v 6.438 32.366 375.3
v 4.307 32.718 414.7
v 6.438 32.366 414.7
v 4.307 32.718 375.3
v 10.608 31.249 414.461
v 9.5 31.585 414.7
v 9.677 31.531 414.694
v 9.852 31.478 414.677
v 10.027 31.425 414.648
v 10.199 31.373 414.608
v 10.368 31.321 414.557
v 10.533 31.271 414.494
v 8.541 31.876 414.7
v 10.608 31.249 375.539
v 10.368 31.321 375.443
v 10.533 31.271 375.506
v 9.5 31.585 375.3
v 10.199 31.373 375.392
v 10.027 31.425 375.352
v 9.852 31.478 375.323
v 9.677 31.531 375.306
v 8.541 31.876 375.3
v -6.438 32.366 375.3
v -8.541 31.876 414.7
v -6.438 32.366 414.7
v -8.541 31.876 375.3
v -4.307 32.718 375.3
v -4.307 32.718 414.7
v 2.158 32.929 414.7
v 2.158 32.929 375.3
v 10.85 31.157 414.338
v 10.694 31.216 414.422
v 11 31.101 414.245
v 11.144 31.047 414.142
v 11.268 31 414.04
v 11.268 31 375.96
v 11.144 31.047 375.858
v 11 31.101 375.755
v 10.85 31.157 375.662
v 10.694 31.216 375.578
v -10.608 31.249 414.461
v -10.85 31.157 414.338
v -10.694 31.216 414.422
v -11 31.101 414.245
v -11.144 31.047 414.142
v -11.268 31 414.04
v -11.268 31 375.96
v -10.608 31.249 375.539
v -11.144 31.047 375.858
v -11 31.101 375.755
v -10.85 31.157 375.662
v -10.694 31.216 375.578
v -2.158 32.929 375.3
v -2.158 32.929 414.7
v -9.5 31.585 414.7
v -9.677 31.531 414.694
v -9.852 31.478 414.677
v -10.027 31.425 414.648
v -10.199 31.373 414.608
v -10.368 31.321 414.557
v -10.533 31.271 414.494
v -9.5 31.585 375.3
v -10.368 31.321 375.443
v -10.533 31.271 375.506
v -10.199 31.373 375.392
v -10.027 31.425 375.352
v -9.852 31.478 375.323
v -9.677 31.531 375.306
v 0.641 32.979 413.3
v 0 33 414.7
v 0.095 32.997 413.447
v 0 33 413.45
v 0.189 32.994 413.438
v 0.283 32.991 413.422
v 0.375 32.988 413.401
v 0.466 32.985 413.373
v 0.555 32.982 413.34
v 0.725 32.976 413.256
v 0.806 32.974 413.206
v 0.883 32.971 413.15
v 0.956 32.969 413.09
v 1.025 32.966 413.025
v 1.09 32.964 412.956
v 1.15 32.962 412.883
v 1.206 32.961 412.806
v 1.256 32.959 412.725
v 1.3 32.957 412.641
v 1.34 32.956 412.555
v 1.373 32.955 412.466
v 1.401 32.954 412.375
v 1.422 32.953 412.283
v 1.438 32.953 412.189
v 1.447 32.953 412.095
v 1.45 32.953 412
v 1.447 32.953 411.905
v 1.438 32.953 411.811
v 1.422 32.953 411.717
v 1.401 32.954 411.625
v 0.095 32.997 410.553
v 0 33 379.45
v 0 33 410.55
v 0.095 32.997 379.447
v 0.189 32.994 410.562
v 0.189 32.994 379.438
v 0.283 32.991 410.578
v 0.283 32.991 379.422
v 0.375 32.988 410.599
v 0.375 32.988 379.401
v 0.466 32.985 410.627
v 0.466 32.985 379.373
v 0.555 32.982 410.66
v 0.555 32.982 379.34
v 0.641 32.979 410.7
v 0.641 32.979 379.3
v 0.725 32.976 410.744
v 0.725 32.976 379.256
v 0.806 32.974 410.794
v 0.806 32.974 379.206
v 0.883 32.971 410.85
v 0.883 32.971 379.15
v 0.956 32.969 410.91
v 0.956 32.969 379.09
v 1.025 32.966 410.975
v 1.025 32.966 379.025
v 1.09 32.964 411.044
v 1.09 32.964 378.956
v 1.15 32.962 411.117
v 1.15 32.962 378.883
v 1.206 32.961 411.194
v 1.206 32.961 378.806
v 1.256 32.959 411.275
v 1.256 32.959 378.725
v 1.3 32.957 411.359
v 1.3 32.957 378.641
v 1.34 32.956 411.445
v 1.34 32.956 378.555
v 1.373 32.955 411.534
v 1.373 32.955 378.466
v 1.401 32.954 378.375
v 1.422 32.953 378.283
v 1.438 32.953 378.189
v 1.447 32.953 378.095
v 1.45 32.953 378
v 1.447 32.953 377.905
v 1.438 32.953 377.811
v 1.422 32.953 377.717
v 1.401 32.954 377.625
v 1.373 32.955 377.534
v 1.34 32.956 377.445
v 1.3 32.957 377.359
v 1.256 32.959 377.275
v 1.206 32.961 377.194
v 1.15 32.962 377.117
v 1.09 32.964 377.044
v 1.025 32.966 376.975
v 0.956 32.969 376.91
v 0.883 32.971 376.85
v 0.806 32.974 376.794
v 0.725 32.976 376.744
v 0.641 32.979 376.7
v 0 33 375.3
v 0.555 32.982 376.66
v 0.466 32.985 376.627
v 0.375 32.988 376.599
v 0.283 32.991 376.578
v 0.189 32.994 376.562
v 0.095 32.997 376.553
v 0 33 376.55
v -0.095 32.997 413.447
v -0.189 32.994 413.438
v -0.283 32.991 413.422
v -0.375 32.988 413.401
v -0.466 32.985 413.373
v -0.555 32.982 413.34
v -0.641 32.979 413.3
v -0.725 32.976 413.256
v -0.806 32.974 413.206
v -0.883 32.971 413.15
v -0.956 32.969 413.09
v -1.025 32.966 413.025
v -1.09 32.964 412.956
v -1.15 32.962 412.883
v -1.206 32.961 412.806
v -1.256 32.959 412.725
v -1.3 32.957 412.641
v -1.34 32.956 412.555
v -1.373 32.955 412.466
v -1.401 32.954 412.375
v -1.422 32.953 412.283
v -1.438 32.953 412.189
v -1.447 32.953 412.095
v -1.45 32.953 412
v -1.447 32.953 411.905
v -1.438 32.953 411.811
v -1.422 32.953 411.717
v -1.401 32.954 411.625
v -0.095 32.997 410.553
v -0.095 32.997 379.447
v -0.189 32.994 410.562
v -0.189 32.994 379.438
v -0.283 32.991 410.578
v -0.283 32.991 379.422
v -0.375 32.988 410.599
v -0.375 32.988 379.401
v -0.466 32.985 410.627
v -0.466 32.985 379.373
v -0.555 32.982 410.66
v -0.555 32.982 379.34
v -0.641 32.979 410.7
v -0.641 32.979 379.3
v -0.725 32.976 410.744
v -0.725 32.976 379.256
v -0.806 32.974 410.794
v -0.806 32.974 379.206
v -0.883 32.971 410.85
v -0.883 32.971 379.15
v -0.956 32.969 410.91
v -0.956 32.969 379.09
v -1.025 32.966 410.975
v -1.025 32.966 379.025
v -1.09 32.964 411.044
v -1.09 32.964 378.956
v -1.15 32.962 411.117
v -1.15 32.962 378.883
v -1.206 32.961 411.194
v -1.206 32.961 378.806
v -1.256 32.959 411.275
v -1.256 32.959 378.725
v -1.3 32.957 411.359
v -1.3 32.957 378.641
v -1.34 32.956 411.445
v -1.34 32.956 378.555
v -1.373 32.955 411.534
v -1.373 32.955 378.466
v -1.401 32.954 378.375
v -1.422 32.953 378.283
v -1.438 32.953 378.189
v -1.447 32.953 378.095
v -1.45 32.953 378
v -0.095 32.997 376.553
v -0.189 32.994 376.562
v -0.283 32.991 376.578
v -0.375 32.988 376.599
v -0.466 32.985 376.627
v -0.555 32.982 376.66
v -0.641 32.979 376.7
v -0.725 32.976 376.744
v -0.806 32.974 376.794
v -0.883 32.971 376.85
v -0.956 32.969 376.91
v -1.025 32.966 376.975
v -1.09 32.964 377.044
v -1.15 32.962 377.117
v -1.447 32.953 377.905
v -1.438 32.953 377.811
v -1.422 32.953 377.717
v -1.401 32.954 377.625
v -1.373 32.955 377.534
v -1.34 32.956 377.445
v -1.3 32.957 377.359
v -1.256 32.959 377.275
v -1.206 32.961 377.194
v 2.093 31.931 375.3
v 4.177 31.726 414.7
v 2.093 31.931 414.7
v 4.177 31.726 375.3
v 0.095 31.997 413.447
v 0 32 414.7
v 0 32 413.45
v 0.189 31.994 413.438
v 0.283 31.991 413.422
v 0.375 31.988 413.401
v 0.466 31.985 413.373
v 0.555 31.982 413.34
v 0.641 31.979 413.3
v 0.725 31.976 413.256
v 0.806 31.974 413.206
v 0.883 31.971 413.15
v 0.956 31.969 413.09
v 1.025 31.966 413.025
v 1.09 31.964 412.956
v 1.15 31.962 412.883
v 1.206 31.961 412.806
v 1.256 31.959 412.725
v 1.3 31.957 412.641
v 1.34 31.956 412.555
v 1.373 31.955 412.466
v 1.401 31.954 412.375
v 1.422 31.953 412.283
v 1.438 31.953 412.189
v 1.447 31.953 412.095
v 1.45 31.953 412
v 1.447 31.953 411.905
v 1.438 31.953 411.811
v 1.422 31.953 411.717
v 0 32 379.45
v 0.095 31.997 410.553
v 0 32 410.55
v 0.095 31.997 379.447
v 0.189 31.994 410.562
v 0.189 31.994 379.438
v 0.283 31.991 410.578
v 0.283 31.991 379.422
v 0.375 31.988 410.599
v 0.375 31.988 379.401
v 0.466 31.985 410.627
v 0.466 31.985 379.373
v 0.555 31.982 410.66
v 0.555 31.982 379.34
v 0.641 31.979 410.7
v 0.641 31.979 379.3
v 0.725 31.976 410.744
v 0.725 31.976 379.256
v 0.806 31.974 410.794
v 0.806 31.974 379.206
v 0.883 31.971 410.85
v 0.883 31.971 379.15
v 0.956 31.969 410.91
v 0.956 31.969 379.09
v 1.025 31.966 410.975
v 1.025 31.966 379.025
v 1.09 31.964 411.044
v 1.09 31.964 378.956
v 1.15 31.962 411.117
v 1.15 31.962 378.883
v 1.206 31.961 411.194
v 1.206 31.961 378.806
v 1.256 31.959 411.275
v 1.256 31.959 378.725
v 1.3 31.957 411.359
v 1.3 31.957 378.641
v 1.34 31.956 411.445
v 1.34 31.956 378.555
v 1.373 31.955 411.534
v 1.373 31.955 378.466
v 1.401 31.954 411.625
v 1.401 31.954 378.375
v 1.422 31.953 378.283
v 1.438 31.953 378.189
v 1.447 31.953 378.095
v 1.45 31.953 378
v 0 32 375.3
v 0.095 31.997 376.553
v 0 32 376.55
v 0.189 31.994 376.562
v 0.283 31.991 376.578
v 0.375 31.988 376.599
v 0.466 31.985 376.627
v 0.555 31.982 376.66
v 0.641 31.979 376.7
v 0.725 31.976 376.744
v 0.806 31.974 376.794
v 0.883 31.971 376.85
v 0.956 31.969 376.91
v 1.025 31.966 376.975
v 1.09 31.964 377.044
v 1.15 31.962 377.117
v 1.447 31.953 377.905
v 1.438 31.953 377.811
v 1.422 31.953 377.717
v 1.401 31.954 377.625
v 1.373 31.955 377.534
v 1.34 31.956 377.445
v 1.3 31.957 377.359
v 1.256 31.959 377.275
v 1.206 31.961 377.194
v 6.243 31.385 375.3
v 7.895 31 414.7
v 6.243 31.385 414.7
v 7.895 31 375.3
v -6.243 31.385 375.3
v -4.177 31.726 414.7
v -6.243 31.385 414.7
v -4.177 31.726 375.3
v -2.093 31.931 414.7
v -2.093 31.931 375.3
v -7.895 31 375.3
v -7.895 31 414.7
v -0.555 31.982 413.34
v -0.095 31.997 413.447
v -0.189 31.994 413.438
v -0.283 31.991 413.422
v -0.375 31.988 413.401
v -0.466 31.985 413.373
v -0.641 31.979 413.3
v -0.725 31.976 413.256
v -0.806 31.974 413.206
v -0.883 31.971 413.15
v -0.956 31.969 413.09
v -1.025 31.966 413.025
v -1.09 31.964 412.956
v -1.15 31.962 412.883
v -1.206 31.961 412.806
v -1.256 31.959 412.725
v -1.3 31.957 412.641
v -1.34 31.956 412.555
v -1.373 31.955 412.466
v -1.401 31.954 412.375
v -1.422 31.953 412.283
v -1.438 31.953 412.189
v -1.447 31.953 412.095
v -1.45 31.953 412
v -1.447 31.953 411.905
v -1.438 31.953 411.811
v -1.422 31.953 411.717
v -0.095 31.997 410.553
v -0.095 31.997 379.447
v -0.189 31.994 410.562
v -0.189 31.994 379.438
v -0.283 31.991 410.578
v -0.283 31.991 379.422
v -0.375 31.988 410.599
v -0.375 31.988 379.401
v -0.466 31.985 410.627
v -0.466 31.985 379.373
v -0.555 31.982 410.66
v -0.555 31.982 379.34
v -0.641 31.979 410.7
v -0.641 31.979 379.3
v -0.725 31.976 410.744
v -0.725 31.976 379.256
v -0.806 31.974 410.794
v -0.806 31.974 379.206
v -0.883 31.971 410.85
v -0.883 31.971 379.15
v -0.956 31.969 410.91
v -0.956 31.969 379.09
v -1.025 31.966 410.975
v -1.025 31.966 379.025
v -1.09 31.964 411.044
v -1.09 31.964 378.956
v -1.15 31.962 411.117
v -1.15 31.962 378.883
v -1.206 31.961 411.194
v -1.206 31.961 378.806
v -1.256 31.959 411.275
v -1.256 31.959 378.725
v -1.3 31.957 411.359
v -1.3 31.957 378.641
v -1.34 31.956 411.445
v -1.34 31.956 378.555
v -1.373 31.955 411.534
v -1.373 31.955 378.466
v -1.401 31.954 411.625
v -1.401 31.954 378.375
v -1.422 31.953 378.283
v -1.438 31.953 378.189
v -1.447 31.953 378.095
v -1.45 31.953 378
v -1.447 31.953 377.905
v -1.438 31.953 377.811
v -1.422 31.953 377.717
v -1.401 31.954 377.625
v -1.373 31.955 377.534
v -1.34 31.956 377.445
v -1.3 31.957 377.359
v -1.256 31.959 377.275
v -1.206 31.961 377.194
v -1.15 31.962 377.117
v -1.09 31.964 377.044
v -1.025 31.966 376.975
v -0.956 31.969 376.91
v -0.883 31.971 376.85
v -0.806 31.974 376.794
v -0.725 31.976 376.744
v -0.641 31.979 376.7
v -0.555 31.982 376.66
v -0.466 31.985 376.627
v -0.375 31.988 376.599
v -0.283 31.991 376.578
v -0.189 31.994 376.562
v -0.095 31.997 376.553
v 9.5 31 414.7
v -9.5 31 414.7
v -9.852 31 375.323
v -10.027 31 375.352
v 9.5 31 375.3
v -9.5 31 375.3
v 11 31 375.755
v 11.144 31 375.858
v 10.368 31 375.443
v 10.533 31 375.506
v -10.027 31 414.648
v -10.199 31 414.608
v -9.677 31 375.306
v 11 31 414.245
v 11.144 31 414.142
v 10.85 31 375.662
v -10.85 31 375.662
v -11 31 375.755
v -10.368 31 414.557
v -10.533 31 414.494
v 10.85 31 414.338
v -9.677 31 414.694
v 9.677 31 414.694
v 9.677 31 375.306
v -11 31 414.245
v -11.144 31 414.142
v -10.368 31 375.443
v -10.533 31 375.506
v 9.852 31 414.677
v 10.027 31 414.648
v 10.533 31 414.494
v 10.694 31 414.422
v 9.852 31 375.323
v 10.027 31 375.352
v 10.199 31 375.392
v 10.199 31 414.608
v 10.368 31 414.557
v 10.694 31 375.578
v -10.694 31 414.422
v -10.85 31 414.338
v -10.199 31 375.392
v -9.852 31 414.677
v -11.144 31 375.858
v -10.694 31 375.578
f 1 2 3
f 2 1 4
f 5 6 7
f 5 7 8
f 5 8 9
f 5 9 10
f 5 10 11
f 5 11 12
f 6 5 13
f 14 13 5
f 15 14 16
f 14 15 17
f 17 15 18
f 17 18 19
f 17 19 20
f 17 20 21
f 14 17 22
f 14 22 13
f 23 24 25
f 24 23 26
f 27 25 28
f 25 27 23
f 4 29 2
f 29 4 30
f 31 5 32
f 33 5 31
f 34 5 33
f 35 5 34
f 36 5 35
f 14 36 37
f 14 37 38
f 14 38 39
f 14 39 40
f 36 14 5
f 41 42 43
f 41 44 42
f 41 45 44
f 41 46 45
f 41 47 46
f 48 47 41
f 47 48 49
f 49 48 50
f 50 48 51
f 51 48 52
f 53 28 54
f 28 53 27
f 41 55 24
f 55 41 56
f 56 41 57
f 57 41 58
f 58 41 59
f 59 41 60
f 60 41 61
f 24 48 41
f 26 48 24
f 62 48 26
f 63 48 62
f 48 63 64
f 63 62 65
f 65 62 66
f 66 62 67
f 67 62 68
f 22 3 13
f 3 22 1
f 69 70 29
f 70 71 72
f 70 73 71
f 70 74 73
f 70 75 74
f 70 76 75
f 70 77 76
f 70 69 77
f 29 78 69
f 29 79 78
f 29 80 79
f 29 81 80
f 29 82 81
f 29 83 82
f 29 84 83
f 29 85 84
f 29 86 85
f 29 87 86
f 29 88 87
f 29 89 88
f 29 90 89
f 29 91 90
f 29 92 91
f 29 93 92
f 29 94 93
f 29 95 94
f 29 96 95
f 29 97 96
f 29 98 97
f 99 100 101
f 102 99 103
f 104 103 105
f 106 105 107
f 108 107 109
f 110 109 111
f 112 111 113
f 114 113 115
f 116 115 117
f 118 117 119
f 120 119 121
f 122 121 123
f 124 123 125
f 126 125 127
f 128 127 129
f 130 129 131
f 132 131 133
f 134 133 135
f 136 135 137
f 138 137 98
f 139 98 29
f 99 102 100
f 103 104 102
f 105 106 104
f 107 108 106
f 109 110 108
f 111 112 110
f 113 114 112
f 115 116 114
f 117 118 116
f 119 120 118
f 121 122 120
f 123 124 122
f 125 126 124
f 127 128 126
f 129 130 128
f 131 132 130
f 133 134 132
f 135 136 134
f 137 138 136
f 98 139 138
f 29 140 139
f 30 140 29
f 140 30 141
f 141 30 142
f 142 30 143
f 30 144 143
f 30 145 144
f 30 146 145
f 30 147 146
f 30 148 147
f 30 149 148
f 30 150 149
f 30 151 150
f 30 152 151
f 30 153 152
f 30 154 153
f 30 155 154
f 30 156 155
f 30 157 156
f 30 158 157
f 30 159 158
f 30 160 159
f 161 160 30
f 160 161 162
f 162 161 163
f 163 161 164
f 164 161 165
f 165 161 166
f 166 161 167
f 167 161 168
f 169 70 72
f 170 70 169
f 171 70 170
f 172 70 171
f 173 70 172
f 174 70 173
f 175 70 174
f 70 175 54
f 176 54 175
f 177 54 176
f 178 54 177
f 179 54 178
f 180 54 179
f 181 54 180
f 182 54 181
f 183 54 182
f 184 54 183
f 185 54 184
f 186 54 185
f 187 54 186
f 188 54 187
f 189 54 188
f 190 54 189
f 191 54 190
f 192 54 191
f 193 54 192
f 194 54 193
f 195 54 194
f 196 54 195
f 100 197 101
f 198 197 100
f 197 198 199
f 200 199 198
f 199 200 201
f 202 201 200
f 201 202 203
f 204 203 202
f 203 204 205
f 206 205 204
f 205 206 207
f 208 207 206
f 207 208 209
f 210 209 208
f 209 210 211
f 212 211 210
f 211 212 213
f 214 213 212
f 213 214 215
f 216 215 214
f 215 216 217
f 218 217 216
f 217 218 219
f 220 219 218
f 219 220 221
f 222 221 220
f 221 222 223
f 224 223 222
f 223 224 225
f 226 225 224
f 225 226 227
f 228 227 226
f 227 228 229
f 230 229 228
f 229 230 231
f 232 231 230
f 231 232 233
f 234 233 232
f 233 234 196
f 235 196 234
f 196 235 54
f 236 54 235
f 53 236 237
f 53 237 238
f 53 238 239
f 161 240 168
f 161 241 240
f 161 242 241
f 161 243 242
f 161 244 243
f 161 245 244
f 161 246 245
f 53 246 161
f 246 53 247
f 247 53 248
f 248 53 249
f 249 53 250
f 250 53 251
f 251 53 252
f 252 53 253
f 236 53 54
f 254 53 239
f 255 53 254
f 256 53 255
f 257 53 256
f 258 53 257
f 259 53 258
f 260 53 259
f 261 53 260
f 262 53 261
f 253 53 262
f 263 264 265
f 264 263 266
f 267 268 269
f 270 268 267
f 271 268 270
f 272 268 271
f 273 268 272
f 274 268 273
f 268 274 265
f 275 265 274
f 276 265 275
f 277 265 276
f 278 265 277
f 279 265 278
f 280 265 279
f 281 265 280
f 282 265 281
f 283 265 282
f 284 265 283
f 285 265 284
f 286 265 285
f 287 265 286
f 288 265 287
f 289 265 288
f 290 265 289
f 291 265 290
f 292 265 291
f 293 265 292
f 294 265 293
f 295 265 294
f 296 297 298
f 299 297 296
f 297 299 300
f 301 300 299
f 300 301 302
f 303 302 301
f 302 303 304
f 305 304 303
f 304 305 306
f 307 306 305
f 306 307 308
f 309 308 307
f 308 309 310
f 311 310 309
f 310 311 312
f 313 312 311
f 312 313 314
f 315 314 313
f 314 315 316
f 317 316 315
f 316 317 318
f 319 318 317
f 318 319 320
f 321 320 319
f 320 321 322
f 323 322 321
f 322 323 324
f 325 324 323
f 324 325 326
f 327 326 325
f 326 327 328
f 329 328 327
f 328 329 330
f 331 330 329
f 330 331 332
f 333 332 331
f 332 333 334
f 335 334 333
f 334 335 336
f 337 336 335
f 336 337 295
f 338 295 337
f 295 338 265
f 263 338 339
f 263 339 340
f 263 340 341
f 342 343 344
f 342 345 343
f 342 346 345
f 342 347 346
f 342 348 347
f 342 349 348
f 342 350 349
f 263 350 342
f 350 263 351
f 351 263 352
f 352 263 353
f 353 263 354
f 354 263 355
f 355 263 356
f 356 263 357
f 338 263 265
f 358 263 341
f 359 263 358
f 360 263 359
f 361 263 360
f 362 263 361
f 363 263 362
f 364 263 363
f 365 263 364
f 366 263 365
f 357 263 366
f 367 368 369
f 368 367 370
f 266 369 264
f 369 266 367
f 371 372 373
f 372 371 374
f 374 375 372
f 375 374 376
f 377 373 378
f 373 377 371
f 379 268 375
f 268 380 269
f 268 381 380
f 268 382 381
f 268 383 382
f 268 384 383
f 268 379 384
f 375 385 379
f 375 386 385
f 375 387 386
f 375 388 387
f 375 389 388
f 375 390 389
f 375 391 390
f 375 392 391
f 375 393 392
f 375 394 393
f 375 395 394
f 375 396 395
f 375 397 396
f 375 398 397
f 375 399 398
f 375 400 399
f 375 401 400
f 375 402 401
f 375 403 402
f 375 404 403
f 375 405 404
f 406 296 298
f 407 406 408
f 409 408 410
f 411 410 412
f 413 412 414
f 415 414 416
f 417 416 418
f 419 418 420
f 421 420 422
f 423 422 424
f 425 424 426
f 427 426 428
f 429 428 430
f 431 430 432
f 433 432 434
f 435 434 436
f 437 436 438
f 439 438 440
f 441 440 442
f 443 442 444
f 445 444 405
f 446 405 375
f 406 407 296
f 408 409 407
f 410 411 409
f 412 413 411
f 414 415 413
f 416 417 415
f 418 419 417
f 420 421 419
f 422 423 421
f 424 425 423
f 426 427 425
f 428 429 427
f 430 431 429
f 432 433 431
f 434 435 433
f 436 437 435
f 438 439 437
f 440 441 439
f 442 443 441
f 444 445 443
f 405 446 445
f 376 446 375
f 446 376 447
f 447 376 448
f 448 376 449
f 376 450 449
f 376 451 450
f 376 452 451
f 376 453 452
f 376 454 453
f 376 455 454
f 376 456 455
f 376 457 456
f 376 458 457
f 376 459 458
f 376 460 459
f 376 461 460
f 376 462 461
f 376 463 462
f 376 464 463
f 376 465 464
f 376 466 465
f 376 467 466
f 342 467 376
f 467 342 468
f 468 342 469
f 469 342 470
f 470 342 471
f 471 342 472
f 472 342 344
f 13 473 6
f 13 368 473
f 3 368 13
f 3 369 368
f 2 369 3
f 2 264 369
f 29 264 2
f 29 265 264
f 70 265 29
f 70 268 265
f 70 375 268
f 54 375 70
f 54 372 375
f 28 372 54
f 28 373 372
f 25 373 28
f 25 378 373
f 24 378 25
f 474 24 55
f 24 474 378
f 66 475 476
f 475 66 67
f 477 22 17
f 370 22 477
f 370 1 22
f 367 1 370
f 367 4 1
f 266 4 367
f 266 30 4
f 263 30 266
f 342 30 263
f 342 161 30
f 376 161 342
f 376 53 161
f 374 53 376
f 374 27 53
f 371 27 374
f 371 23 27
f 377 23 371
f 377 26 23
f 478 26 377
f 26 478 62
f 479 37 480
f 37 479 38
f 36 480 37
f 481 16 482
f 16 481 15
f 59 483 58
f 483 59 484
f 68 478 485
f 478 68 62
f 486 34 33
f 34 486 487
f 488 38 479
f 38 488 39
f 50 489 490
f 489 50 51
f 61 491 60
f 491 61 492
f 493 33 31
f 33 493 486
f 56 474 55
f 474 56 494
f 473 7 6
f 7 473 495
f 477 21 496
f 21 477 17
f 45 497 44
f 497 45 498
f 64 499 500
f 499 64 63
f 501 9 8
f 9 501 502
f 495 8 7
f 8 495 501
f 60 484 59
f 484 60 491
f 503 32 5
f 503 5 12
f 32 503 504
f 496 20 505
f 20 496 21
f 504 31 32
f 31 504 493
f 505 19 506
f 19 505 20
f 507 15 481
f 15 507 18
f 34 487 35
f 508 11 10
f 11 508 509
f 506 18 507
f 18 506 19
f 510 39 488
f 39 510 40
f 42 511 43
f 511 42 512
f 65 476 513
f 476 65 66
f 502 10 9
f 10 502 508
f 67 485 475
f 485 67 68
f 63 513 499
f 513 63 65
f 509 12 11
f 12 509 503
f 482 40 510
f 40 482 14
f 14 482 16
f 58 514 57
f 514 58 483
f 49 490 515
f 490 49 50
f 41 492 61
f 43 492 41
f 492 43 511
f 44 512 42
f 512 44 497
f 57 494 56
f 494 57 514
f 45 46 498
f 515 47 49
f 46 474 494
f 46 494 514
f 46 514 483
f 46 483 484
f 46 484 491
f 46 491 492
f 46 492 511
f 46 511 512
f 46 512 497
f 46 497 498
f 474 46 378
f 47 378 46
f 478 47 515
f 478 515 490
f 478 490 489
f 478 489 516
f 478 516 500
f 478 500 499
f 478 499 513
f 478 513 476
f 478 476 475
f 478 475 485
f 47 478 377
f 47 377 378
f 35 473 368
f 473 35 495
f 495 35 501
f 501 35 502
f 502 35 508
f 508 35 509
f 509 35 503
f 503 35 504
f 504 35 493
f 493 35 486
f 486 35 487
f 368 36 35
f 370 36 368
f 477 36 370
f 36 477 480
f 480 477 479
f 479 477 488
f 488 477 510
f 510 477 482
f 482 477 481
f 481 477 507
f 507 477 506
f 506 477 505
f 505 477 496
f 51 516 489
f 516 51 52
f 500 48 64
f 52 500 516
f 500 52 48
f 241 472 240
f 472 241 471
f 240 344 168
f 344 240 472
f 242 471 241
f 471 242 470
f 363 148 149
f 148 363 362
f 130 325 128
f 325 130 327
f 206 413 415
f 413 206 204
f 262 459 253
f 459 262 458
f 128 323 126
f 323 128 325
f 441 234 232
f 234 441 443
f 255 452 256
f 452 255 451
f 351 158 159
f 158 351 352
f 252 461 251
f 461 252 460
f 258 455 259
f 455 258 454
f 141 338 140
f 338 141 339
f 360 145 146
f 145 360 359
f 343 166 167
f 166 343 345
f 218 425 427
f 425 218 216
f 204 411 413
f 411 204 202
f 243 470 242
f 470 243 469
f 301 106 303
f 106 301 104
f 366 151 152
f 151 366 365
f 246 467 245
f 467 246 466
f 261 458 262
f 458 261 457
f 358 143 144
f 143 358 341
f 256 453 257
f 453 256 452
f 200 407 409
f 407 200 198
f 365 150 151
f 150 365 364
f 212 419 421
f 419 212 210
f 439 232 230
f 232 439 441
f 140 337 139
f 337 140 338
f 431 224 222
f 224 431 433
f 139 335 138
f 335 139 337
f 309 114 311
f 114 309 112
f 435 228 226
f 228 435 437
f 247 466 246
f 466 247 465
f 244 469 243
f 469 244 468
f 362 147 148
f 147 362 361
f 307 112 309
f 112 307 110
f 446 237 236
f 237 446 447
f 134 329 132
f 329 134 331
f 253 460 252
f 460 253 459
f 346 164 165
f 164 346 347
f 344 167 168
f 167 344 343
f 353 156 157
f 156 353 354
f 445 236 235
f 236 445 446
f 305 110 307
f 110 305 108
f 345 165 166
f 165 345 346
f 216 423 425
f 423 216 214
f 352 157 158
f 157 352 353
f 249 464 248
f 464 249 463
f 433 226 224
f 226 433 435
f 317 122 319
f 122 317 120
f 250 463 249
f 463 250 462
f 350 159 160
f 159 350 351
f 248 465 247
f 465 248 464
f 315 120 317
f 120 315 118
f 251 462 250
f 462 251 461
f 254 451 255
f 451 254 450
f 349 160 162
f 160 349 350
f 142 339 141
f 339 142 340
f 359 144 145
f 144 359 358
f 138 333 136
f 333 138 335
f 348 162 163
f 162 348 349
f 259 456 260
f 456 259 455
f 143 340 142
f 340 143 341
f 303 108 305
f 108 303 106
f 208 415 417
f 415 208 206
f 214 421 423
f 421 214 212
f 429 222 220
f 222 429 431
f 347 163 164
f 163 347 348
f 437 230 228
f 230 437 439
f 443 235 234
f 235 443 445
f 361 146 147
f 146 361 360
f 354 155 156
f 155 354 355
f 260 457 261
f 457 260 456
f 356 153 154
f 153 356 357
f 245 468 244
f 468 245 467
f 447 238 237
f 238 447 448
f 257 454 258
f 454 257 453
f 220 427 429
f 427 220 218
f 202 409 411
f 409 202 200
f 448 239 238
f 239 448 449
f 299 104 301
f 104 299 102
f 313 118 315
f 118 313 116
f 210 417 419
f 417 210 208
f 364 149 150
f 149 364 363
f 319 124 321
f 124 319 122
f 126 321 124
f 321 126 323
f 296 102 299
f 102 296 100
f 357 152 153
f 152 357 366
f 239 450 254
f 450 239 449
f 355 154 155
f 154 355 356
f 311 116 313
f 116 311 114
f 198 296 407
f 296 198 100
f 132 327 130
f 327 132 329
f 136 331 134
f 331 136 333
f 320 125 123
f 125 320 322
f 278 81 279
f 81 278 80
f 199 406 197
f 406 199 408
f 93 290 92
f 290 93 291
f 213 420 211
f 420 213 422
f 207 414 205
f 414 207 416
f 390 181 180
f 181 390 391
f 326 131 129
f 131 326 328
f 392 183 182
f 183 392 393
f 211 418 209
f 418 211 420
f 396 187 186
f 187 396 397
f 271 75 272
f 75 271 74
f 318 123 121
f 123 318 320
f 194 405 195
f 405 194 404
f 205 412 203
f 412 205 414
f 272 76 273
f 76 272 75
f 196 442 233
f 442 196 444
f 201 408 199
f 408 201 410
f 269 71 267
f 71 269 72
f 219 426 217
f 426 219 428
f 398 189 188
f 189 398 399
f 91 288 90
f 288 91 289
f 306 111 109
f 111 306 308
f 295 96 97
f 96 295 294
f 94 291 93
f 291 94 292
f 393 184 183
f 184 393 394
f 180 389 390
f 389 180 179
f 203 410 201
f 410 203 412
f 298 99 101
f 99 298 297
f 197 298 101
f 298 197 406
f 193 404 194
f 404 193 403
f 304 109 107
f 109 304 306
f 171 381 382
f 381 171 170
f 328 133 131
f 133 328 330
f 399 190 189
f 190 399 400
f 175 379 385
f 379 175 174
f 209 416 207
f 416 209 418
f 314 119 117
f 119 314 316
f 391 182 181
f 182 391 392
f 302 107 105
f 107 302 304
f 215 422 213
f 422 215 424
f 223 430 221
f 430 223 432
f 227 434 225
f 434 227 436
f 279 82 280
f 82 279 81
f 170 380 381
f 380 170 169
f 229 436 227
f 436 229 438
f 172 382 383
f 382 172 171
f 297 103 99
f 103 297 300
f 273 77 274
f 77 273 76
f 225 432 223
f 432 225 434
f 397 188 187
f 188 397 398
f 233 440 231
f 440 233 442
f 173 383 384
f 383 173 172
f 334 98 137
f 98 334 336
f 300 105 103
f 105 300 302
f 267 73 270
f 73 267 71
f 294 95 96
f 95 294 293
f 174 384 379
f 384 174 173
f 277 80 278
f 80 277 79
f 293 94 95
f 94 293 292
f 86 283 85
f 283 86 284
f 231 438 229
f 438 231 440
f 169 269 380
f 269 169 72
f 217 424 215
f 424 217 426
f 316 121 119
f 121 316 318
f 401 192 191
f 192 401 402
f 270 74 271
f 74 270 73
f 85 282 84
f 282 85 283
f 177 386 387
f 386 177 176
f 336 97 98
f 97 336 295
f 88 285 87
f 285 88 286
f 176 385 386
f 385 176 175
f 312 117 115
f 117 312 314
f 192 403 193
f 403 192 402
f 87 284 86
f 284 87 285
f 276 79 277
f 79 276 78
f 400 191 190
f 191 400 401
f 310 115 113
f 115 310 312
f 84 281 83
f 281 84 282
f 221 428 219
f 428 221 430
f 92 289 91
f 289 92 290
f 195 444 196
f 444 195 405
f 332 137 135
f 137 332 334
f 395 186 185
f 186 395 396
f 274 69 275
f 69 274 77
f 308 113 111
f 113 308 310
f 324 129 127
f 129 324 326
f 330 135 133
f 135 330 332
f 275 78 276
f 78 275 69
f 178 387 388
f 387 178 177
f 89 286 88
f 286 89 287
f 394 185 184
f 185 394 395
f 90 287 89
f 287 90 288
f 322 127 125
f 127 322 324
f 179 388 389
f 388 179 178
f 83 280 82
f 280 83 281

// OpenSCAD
// file: ../lib/astra66_core.scad
// =============================================================================
// ASTRA-66 CAD rev B -- core library
// Parameters (generated from analysis.py by build.py), derived stations and helpers.
// Every part file includes this; stations mirror analysis.py X[] exactly.
//
// Frame: rocket axis = +Z, STA 0 = nose tip, stations increase aft.
// Angles: measured about +Z from +X toward +Y.  90 deg = switch / hatch side,
// 270 deg = camera side, 45 deg = rail-button line, fins at 0/90/180/270 deg.
// =============================================================================
include <../astra66_params.scad>

$fn = FN;
EPS = 0.01;
CAD_REV = "B";

// ----------------------------------------------------------------- radii
R_OD    = BODY_OD / 2;                 // body tube outer
R_ID    = BODY_ID / 2;                 // body tube inner
R_SH    = (BODY_ID - FIT_SH) / 2;      // printed shoulder / ring OD radius
R_SI    = R_SH - NC_SH_WALL;           // nose shoulder inner radius
R_CO    = CPL_OD / 2;                  // coupler outer
R_CI    = CPL_ID / 2;                  // coupler inner
R_BH_IN = (CPL_ID - 0.2) / 2;          // inner bulkhead disc (fits in coupler)
R_MO    = MMT_OD / 2;
R_MI    = MMT_ID / 2;
R_RING_BORE = (MMT_OD + FIT_SH) / 2;   // centering-ring / core bore
R_TAB_FLOOR = max(R_MO, RET_CLEAR_D / 2);          // rev B: tab clears the COTS retainer
FIN_TAB_H   = R_OD - R_TAB_FLOOR - FIN_TAB_CLR;

// ----------------------------------------------------------------- stations
X_NC_BASE     = NC_L;
X_SH_END      = NC_L + NC_SH_L;
X_PL_END      = NC_L + PL_L;
X_BAND_END    = X_PL_END + AV_BAND_L;
X_END         = X_BAND_END + BO_L;
L_OVERALL     = X_END;                              // airframe length (excl. COTS retainer)
X_CPL_FWD     = X_PL_END - AV_INS;
X_CPL_AFT     = X_BAND_END + AV_INS;
X_AVB_FWD_OUT = X_CPL_FWD - AV_BH_T;                // AV-303 forward face
X_AVB_AFT_OUT = X_CPL_AFT + GASKET_T;               // AV-304 outer-disc forward face
X_AVB_AFT_END = X_AVB_AFT_OUT + AV_BH_T;            // AV-304 aft face (recovery bay starts)
X_SLED_FWD    = X_CPL_FWD + AV_BH_T + SLED_FWD_GAP;
X_SLED_AFT    = X_SLED_FWD + SLED_L;
X_MMT_AFT     = X_END + MMT_AFT_EXT;
X_MMT_FWD     = X_MMT_AFT - MMT_L;
X_FIN_LE      = X_END - FIN_CR;
X_TAB_FWD     = X_FIN_LE + FIN_TAB_FWD;
X_TAB_AFT     = X_END - LOCK_T;
X_CORE_FWD    = X_TAB_FWD - CORE_RING_T;
X_CORE_AFT    = X_END - LOCK_T;
X_NC_SCREW    = NC_L + NC_SH_L / 2;
X_CAM         = X_SH_END + CAM_OFF;
X_HATCH       = X_SH_END + HATCH_OFF;
X_RB_FWD      = X_MMT_FWD - RB_FWD_OFF;
X_RB_AFT      = X_END - RB_AFT_OFF;
X_TRAY_FWD    = X_AVB_FWD_OUT - TRAY_L;
X_SW          = X_PL_END + AV_BAND_L / 2;
X_MOTOR_FWD   = X_MMT_AFT - MOTOR_L;
X_BAT0        = X_SLED_FWD + 2;
BAT_CAGE_L    = 12 + BAT_L + 0.6;
PAYLOAD_BAY_L  = X_AVB_FWD_OUT - X_SH_END;
RECOVERY_BAY_L = X_MMT_FWD - X_AVB_AFT_END;

FIN_ANGLES      = [for (i = [0 : FIN_N - 1]) i * 360 / FIN_N];
LOCK_SCREW_ANG  = [45, 135, 225, 315];
STATIC_PORT_ANG = [45, 135, 225, 315];

// ----------------------------------------------------------------- geometry helpers
function ogive_rho()  = (R_OD * R_OD + NC_L * NC_L) / (2 * R_OD);
function ogive_r(x)   = sqrt(max(pow(ogive_rho(), 2) - pow(NC_L - x, 2), 0)) + R_OD - ogive_rho();

// Solid of revolution of the tangent ogive between stations x0..x1, radially offset inward by off.
module ogive_solid(x0, x1, off = 0, n = 72) {
    s = (x0 == 0) ? 1 : 0;
    rotate_extrude()
        polygon(concat([[0, x0]],
                       [for (i = [s : n]) let(x = x0 + (x1 - x0) * i / n) [max(ogive_r(x) - off, 0.01), x]],
                       [[0, x1]]));
}

module tube_r(ro, ri, z0, z1) {
    translate([0, 0, z0]) difference() {
        cylinder(r = ro, h = z1 - z0);
        translate([0, 0, -1]) cylinder(r = ri, h = z1 - z0 + 2);
    }
}

module at_angle(a) { rotate([0, 0, a]) children(); }

// Cylinder of diameter d along the radial direction at angle a, from radius r0 to r1, at station z.
module radial_cyl(d, z, a, r0, r1) {
    at_angle(a) translate([r0, 0, z]) rotate([0, 90, 0]) cylinder(d = d, h = r1 - r0);
}

module rounded_rect(l, w, r) { offset(r = r) square([l - 2 * r, w - 2 * r], center = true); }

// Radial prism with a rounded-rectangle footprint (l axial x w tangential) centred at station z.
module radial_prism(a, z, l, w, rr, r0, r1) {
    at_angle(a) translate([r0, 0, z]) rotate([0, 90, 0]) linear_extrude(r1 - r0) rounded_rect(l, w, rr);
}

// Block in the radial frame at angle a: radial r0..r1, tangential +/-hw, stations z0..z1, clipped to radius rc.
module radial_block(a, r0, r1, hw, z0, z1, rc) {
    intersection() {
        at_angle(a) translate([r0, -hw, z0]) cube([r1 - r0, 2 * hw, z1 - z0]);
        translate([0, 0, z0 - 1]) cylinder(r = rc, h = z1 - z0 + 2);
    }
}

// Camera frame: child +Z = lens axis (outward, tilted CAM_TILT aft), origin at the lens face centre.
// Lens-face radius CAM_R0 is the smaller of (a) the tilted barrel rim 0.5 mm inside the bore and
// (b) the tilted camera-body corners 0.5 mm inside the bore -- so any CAM_W/CAM_LEN entered fits.
CAM_SETBACK = CAM_LENS_L * cos(CAM_TILT) + (CAM_LENS_HOLE - 1) / 2 * sin(CAM_TILT) + 0.5;
CAM_R0 = min(R_ID - CAM_SETBACK, sqrt(pow(R_ID - 0.5, 2) - pow(CAM_W / 2, 2)) - CAM_LEN / 2 * sin(CAM_TILT));
module cam_frame() {
    at_angle(CAM_ANG) translate([CAM_R0, 0, X_CAM]) rotate([0, 90 - CAM_TILT, 0]) children();
}

echo(str("ASTRA-66 CAD rev ", CAD_REV, ": L_OVERALL=", L_OVERALL, " payload bay=", PAYLOAD_BAY_L,
         " recovery bay=", RECOVERY_BAY_L, " fin tab depth=", FIN_TAB_H));
// main file
// ASTRA-66 CAD rev B -- PL-205 Access hatch (service feature)
// Curved panel = body-tube wall section, HATCH_GAP smaller than the cut-out all round, 2x M2.5 button-head
// screws into PL-206 ledge inserts at X_HATCH +/- HATCH_SCREW_OFF. PETG, FDM.
include <../lib/astra66_core.scad>

module PL_205_access_hatch() {
    difference() {
        intersection() {
            tube_r(R_OD, R_ID, X_HATCH - HATCH_L, X_HATCH + HATCH_L);
            radial_prism(HATCH_ANG, X_HATCH, HATCH_L - 2 * HATCH_GAP, HATCH_W - 2 * HATCH_GAP, 3 - HATCH_GAP, R_ID - 1, R_OD + 1);
        }
        for (s = [-1, 1]) radial_cyl(CLR_M25, X_HATCH + s * HATCH_SCREW_OFF, HATCH_ANG, R_ID - 1, R_OD + 1);
    }
}

PL_205_access_hatch();
